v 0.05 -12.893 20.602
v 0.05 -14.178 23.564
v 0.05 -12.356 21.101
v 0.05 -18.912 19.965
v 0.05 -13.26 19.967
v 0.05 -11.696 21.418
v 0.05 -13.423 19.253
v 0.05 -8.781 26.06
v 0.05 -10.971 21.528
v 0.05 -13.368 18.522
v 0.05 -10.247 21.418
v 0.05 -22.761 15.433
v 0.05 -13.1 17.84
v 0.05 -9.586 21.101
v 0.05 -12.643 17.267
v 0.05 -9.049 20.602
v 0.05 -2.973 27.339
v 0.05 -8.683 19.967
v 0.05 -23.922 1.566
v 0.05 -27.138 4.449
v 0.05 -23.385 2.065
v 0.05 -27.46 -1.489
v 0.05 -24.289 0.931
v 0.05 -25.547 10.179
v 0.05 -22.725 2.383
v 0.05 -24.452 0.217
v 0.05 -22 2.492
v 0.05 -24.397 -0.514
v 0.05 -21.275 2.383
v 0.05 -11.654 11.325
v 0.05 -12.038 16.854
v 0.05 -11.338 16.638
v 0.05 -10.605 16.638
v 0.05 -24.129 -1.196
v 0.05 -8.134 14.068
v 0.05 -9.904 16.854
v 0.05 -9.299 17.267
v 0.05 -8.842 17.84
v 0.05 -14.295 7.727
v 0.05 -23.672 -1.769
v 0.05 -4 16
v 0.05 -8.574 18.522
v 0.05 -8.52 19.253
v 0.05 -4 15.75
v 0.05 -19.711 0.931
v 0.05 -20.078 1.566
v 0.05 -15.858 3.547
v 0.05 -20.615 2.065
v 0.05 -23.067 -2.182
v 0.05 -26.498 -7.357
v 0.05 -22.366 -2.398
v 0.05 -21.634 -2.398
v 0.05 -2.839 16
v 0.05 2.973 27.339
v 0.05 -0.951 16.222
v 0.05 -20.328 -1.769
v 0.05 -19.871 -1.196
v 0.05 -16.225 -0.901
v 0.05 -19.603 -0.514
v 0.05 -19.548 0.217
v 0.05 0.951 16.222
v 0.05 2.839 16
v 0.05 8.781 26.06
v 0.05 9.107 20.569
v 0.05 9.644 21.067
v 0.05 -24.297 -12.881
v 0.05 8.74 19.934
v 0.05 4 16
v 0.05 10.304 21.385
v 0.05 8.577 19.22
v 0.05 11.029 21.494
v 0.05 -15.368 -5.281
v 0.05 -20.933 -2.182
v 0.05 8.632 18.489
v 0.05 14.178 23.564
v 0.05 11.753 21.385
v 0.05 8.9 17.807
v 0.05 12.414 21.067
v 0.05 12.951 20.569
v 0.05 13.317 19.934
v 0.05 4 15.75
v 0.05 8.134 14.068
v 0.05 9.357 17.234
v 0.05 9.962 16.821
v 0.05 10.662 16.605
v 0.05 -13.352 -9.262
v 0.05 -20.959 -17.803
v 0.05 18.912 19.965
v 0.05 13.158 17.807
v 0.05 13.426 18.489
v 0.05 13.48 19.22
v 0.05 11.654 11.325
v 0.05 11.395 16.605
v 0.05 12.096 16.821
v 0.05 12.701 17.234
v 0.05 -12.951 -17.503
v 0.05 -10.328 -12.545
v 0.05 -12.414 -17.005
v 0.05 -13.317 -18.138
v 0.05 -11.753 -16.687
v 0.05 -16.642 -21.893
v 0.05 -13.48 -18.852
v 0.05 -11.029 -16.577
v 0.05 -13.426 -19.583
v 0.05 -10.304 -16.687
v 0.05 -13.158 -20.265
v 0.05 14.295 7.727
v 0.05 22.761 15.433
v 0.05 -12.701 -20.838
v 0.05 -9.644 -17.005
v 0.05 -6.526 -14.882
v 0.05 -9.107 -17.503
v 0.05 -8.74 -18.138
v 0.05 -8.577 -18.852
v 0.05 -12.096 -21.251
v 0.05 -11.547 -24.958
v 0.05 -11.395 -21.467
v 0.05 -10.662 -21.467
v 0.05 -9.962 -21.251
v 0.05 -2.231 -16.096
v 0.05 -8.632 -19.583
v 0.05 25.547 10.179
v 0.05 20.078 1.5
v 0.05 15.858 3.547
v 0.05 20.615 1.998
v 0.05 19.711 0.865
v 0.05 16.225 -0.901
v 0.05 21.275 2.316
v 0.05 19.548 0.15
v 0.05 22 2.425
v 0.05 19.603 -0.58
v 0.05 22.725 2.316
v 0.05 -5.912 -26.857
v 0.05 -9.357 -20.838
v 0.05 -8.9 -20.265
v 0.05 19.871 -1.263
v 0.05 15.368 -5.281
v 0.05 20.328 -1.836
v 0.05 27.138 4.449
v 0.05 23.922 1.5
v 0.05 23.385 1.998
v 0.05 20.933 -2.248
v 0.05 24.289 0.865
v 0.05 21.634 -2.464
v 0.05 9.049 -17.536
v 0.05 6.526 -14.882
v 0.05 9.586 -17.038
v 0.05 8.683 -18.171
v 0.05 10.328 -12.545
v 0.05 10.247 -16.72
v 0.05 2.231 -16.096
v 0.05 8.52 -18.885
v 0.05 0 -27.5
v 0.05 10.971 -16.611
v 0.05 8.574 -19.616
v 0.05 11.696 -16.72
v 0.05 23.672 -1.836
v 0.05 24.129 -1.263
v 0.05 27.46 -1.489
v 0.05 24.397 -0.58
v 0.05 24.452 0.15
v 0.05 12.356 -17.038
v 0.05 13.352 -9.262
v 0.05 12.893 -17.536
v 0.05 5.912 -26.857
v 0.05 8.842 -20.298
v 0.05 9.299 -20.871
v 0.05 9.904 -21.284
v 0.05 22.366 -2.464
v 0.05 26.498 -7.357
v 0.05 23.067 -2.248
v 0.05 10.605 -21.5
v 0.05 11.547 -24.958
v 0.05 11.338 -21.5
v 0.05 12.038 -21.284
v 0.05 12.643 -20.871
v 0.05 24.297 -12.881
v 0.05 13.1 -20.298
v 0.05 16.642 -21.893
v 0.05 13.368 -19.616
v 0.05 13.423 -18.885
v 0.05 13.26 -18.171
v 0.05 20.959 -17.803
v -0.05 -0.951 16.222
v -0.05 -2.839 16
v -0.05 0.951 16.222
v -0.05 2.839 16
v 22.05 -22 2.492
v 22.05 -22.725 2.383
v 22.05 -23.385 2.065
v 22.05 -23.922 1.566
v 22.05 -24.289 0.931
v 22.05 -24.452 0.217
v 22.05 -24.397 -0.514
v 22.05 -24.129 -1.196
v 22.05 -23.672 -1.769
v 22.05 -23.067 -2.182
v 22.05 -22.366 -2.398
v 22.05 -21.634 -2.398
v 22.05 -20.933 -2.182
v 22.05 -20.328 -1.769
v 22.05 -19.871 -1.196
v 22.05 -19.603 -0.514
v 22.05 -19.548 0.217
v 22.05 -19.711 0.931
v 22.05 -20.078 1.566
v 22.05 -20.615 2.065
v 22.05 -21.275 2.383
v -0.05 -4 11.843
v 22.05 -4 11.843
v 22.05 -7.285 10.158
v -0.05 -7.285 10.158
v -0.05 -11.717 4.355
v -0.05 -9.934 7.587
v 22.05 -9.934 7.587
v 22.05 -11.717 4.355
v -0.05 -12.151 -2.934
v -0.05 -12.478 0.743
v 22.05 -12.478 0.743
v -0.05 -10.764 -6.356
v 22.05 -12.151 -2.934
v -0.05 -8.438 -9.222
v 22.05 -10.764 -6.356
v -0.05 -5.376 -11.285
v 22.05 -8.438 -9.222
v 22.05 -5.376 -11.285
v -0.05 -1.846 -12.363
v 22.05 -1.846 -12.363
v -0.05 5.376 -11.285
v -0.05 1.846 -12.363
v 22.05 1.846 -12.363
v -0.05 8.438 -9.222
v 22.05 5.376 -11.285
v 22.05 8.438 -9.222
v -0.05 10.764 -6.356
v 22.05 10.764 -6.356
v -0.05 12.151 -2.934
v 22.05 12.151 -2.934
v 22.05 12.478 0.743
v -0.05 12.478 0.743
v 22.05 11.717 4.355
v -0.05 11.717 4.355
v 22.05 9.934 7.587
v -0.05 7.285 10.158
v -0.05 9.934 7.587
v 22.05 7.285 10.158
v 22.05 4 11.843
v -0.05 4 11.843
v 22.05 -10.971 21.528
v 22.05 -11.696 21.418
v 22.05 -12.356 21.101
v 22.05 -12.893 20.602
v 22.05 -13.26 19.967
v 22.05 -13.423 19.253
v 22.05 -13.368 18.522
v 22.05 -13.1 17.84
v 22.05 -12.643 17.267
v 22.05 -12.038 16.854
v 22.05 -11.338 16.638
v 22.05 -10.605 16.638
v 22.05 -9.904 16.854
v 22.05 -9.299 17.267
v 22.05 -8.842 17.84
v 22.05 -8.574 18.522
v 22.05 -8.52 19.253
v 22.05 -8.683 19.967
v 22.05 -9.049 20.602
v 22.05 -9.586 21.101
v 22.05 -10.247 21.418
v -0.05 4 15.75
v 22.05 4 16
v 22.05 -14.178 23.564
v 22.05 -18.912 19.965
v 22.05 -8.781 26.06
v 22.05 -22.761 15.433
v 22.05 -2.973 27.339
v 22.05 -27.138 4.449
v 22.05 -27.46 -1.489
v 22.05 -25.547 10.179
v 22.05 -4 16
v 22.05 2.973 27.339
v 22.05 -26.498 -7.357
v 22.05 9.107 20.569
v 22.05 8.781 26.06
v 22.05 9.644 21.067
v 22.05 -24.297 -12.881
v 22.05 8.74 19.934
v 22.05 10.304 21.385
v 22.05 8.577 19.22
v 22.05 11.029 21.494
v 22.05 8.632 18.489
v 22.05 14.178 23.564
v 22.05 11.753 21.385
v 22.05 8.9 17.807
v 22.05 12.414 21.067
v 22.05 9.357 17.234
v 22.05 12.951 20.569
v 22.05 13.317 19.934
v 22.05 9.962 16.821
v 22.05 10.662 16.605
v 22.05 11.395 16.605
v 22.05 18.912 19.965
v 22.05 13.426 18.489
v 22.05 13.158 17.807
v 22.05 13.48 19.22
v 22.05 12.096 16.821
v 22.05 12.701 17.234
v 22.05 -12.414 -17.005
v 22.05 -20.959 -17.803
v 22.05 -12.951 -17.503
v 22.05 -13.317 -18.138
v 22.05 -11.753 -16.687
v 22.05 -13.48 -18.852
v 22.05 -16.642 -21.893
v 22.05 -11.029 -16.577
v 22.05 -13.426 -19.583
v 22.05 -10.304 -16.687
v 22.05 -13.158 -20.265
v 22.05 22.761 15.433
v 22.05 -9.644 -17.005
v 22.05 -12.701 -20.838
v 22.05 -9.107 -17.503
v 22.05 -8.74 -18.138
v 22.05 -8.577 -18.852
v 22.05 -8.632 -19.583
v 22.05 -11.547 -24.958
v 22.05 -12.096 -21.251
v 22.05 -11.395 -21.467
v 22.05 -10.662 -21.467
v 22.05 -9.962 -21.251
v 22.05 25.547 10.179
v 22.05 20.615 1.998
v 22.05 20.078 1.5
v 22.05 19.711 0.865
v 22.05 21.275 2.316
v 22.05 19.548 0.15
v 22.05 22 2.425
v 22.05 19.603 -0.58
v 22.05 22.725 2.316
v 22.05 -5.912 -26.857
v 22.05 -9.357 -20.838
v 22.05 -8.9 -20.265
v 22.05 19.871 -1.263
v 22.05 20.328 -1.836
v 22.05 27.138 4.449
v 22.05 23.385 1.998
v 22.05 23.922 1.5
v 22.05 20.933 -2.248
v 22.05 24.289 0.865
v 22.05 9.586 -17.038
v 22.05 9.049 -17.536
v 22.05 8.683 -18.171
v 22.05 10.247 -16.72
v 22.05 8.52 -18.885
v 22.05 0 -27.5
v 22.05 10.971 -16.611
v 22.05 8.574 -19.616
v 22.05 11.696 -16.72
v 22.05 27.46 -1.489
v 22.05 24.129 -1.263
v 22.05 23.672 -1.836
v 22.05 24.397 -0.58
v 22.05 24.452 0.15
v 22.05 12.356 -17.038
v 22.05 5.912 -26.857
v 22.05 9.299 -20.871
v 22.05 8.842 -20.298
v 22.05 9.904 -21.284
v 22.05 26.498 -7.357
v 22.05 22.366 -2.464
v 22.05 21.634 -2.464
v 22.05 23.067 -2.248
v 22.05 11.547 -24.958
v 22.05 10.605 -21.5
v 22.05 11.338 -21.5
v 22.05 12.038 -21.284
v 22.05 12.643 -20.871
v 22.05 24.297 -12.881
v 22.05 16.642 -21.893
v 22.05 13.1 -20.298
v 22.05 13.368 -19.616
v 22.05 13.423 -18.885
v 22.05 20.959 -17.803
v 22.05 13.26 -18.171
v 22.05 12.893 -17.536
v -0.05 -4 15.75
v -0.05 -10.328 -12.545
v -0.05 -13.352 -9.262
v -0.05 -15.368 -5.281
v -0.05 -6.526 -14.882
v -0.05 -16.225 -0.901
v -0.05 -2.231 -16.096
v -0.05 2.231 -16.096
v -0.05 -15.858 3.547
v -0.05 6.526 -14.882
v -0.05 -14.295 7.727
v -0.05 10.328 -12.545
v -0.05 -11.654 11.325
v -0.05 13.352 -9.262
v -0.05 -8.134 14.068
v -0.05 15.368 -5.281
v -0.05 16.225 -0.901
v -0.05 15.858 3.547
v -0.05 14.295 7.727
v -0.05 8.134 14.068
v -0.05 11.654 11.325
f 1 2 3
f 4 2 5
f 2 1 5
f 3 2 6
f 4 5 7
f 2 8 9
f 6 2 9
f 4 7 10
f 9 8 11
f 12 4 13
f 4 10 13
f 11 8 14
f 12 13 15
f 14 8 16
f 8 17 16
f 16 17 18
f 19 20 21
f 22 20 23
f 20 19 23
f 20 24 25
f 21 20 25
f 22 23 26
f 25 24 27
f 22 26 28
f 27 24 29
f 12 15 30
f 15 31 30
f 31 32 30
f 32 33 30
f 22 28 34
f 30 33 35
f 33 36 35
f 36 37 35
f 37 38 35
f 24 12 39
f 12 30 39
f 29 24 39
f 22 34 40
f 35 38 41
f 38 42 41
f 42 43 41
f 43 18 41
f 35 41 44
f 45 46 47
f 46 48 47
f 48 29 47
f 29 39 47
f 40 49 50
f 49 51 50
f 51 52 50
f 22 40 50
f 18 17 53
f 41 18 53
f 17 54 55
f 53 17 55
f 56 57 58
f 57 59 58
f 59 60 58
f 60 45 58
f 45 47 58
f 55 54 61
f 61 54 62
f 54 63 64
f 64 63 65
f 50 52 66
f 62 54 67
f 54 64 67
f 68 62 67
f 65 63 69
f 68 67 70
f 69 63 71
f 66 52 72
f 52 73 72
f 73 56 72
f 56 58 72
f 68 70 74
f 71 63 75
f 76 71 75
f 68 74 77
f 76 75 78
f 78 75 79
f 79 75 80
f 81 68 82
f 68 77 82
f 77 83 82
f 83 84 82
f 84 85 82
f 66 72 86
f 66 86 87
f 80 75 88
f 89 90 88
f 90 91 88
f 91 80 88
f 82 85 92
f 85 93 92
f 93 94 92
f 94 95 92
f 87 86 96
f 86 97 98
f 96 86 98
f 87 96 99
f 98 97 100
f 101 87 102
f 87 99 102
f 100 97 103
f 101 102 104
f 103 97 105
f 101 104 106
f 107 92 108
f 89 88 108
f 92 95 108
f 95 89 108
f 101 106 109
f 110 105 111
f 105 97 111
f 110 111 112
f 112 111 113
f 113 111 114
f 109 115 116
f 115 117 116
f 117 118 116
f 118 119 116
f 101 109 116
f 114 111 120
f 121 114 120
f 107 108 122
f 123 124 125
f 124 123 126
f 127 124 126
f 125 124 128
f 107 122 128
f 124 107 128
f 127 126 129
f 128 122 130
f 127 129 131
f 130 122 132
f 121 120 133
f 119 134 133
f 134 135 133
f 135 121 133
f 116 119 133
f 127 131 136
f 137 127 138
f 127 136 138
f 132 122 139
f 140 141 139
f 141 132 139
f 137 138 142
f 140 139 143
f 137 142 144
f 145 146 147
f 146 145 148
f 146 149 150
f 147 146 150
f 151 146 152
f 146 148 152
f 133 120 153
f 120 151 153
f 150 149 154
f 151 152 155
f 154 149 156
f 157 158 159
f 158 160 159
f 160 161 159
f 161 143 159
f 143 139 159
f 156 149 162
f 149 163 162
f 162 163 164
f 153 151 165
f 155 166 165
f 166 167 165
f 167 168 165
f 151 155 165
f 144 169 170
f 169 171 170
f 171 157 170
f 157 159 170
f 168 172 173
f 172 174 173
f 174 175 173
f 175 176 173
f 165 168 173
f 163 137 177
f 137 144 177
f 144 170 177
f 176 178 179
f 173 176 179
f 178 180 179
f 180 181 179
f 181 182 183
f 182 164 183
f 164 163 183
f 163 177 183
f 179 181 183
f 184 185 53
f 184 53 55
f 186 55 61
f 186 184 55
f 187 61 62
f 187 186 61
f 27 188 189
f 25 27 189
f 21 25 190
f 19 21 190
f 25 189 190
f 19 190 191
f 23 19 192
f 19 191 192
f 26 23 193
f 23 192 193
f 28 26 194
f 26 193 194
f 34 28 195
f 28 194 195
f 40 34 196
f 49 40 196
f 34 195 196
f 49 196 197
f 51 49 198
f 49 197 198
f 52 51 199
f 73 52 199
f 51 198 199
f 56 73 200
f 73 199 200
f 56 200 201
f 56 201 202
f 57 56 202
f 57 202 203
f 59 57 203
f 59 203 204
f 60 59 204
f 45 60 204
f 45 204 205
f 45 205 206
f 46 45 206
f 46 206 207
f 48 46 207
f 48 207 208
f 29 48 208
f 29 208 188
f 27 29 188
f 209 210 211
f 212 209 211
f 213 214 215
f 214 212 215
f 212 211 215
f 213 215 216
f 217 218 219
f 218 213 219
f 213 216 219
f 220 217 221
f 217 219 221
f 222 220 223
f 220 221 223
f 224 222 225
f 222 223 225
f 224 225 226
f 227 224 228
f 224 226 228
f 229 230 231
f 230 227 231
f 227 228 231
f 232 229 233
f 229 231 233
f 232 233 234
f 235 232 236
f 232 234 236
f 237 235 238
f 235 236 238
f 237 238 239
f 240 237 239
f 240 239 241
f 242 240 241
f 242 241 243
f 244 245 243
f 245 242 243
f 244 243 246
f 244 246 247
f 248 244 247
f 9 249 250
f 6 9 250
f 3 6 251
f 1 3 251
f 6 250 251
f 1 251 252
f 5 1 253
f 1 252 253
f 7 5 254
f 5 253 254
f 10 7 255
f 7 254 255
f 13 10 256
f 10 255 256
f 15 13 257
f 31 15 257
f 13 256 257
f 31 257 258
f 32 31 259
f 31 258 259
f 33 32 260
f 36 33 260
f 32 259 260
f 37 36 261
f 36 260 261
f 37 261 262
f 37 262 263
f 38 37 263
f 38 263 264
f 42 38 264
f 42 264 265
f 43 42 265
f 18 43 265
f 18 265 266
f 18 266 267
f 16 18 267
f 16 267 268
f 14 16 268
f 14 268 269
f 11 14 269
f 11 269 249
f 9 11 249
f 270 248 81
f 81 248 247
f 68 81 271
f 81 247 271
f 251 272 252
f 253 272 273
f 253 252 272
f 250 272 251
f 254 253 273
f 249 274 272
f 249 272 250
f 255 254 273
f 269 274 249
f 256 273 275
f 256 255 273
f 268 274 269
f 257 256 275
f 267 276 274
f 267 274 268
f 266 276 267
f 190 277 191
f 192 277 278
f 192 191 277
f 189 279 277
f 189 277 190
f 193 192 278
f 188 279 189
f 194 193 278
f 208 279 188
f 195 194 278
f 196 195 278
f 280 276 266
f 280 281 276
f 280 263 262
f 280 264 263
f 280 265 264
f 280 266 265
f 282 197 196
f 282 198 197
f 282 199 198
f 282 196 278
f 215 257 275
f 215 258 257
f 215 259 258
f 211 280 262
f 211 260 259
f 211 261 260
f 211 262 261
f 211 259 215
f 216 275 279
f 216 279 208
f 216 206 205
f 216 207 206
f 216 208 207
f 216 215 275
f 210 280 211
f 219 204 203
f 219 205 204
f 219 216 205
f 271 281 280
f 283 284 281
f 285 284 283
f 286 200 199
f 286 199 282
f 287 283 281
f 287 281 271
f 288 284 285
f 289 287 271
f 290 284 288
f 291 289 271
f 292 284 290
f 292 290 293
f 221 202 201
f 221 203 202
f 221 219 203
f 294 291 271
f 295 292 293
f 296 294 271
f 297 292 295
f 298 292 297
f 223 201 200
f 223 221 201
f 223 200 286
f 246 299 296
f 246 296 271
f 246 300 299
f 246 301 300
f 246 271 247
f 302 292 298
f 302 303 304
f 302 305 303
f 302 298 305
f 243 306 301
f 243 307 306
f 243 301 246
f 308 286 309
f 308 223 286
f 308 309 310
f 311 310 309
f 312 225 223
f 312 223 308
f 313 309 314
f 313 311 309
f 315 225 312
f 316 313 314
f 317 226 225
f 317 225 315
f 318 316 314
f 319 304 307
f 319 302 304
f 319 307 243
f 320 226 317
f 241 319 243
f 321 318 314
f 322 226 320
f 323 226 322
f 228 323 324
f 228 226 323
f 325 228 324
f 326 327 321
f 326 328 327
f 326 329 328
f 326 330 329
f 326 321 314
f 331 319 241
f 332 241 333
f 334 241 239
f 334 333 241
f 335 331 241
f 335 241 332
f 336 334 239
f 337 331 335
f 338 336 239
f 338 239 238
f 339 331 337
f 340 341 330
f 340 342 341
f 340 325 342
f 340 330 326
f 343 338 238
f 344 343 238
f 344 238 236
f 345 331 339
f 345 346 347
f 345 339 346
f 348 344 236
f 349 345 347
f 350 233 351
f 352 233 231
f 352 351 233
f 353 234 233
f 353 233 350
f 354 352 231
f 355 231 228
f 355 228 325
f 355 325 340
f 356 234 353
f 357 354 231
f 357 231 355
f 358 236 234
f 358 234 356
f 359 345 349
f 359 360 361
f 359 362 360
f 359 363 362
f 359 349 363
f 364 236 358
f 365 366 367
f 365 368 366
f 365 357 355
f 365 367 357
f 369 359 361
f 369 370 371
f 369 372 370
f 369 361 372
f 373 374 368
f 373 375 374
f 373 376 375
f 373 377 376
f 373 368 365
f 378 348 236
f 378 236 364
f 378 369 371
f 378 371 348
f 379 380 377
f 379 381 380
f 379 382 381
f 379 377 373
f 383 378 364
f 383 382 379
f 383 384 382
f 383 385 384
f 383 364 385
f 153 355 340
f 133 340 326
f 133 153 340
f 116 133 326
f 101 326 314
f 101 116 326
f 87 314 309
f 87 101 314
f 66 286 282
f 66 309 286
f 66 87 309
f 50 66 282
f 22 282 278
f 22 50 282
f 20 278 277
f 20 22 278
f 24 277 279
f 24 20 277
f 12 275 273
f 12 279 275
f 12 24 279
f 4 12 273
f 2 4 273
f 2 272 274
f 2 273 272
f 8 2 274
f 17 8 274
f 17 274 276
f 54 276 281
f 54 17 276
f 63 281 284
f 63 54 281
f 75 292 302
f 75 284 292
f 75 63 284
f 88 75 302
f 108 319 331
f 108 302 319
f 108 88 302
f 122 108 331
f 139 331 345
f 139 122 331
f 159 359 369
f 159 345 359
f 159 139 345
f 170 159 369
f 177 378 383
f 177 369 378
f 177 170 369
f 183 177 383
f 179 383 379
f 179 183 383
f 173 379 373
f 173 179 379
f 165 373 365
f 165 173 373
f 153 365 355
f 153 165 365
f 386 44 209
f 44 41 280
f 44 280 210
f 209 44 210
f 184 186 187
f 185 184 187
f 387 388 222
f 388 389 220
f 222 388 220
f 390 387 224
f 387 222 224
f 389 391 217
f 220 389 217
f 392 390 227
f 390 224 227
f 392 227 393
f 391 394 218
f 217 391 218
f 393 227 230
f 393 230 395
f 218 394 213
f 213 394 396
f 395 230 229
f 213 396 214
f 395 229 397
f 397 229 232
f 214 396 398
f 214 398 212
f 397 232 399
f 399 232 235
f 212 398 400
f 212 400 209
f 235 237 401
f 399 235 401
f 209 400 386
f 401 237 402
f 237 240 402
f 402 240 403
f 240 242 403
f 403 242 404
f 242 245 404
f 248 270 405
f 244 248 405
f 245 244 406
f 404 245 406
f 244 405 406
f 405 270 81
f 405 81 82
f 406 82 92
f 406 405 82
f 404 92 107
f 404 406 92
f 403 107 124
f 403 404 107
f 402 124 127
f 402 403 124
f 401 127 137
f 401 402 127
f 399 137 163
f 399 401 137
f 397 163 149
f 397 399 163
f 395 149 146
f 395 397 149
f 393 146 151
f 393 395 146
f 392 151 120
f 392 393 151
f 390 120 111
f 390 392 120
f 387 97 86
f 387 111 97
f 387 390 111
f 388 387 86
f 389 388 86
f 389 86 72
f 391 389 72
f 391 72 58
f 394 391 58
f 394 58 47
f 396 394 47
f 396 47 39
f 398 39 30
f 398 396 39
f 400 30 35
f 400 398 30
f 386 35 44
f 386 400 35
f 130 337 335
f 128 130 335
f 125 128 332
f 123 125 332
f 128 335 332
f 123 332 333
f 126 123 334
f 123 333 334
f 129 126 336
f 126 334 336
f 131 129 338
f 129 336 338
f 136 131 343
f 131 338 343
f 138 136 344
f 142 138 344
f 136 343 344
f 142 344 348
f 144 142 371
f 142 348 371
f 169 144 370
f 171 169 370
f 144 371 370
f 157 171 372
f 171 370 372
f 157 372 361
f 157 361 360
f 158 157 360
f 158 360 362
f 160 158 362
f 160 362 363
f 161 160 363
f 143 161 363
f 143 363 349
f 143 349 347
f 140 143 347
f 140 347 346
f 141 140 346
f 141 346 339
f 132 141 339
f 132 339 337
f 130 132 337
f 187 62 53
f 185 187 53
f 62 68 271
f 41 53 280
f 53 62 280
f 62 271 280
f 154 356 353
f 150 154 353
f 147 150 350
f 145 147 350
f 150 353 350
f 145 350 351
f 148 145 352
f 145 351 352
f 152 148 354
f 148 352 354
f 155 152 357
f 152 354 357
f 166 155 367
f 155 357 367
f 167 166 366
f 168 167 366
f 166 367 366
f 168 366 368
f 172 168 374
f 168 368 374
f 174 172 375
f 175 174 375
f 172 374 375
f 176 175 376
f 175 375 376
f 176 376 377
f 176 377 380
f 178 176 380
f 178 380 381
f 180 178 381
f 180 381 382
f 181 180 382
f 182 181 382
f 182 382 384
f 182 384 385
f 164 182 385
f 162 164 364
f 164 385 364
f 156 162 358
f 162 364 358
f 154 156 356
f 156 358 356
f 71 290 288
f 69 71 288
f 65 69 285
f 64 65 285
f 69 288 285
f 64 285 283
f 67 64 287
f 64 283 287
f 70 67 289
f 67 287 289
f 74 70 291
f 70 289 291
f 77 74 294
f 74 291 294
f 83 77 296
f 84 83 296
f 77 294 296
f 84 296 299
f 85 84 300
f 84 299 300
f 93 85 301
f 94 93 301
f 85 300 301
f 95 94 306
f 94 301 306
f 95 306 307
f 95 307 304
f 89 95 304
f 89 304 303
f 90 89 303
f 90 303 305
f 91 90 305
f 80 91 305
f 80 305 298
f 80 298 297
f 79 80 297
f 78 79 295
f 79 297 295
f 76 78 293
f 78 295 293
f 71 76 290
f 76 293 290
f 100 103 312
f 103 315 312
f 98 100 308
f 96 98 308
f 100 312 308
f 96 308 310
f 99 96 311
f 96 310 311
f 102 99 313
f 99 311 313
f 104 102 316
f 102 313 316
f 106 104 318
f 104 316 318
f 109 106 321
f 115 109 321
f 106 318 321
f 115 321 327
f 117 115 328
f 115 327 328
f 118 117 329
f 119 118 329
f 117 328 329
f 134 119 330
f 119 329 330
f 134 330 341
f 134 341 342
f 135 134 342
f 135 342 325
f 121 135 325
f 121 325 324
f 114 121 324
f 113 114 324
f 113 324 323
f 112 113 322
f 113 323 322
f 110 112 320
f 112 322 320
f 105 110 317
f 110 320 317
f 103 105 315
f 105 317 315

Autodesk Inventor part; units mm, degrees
ref_plane "YZ Plane" through (0, 0, 0) normal (1, 0, 0) x (0, 1, 0)
ref_plane "XZ Plane" through (0, 0, 0) normal (0, 1, 0) x (-1, 0, 0)
ref_plane "XY Plane" through (0, 0, 0) normal (0, 0, 1) x (1, 0, 0)
sketch "Skizze1" plane through (0, 0, 0) normal (1, 0, 0) x (0, 1, 0)
  circle A0 centre (0, 0) radius 12.5
  circle A1 centre (0, 0) radius 16.25
  dimension "d0" = 25
  dimension "d1" = 32.5
extrude "Extrusion1" add sketch "Skizze1" along normal mid plane 0.1
sketch "Skizze2" plane through (0.05, 0, 0) normal (1, 0, 0) x (0, 0, -1)
  circle A0 centre (0, 0) radius 27.5
  dimension "d5" = 55
extrude "Extrusion2" add sketch "Skizze2" along normal blind 22
sketch "Skizze4" plane through (22.05, 0, 0) normal (1, 0, 0) x (0, 0, -1)
  circle A0 centre (0, 0) radius 12.5
  dimension "d8" = 25
extrude "Extrusion3" cut sketch "Skizze4" against normal blind 30
sketch "Skizze5" plane through (0.05, 0, 0) normal (-1, 0, 0) x (0, 0, 1)
  point P0 (0, 0)
  point P1 (0.0333, -22)
  point P2 (19.0692, -10.9712)
  point P3 (19.0359, 11.0288)
  point P4 (-0.0333, 22)
  point P5 (-19.0692, 10.9712)
  point P6 (-19.0359, -11.0288)
  dimension "d18" = 22
  dimension "d21" = 360
hole "Bohrung1" at (0.05, -22, 0.0333) at (0.05, -10.9712, 19.0692) at (0.05, 11.0288, 19.0359) at (0.05, 22, -0.0333) at (0.05, 10.9712, -19.0692) at (0.05, -11.0288, -19.0359) direction (1, 0, 0) diameter 4.917 end through all thread size "M6x1" class "6H" standard "ISO Metric profile"
sketch "Skizze6" plane through (22.05, 0, 0) normal (1, 0, 0) x (0, 0, -1)
  line L0 (-16, -4) -> (-9, -4)
  line L1 (-9, -4) -> (-9, 4)
  line L2 (-9, 4) -> (-16, 4)
  line L3 (-16, 4) -> (-16, -4)
  circle A0 centre (0, 0) radius 12.5 projected
  line L4 (-16, -4) -> (-9, 4) construction
  line L5 (-9, -4) -> (-16, 4) construction
  point P0 (-12.5, 0)
  point P1 (-11.8427, -4)
  point P2 (-11.8427, 4)
  dimension "d23" = 7
  dimension "d24" = 8
  dimension "d25" = 9
extrude "Extrusion4" cut sketch "Skizze6" against normal blind 52 contours L3 L2 A0 L0
properties part number "Befestigung bremsscheibe"
